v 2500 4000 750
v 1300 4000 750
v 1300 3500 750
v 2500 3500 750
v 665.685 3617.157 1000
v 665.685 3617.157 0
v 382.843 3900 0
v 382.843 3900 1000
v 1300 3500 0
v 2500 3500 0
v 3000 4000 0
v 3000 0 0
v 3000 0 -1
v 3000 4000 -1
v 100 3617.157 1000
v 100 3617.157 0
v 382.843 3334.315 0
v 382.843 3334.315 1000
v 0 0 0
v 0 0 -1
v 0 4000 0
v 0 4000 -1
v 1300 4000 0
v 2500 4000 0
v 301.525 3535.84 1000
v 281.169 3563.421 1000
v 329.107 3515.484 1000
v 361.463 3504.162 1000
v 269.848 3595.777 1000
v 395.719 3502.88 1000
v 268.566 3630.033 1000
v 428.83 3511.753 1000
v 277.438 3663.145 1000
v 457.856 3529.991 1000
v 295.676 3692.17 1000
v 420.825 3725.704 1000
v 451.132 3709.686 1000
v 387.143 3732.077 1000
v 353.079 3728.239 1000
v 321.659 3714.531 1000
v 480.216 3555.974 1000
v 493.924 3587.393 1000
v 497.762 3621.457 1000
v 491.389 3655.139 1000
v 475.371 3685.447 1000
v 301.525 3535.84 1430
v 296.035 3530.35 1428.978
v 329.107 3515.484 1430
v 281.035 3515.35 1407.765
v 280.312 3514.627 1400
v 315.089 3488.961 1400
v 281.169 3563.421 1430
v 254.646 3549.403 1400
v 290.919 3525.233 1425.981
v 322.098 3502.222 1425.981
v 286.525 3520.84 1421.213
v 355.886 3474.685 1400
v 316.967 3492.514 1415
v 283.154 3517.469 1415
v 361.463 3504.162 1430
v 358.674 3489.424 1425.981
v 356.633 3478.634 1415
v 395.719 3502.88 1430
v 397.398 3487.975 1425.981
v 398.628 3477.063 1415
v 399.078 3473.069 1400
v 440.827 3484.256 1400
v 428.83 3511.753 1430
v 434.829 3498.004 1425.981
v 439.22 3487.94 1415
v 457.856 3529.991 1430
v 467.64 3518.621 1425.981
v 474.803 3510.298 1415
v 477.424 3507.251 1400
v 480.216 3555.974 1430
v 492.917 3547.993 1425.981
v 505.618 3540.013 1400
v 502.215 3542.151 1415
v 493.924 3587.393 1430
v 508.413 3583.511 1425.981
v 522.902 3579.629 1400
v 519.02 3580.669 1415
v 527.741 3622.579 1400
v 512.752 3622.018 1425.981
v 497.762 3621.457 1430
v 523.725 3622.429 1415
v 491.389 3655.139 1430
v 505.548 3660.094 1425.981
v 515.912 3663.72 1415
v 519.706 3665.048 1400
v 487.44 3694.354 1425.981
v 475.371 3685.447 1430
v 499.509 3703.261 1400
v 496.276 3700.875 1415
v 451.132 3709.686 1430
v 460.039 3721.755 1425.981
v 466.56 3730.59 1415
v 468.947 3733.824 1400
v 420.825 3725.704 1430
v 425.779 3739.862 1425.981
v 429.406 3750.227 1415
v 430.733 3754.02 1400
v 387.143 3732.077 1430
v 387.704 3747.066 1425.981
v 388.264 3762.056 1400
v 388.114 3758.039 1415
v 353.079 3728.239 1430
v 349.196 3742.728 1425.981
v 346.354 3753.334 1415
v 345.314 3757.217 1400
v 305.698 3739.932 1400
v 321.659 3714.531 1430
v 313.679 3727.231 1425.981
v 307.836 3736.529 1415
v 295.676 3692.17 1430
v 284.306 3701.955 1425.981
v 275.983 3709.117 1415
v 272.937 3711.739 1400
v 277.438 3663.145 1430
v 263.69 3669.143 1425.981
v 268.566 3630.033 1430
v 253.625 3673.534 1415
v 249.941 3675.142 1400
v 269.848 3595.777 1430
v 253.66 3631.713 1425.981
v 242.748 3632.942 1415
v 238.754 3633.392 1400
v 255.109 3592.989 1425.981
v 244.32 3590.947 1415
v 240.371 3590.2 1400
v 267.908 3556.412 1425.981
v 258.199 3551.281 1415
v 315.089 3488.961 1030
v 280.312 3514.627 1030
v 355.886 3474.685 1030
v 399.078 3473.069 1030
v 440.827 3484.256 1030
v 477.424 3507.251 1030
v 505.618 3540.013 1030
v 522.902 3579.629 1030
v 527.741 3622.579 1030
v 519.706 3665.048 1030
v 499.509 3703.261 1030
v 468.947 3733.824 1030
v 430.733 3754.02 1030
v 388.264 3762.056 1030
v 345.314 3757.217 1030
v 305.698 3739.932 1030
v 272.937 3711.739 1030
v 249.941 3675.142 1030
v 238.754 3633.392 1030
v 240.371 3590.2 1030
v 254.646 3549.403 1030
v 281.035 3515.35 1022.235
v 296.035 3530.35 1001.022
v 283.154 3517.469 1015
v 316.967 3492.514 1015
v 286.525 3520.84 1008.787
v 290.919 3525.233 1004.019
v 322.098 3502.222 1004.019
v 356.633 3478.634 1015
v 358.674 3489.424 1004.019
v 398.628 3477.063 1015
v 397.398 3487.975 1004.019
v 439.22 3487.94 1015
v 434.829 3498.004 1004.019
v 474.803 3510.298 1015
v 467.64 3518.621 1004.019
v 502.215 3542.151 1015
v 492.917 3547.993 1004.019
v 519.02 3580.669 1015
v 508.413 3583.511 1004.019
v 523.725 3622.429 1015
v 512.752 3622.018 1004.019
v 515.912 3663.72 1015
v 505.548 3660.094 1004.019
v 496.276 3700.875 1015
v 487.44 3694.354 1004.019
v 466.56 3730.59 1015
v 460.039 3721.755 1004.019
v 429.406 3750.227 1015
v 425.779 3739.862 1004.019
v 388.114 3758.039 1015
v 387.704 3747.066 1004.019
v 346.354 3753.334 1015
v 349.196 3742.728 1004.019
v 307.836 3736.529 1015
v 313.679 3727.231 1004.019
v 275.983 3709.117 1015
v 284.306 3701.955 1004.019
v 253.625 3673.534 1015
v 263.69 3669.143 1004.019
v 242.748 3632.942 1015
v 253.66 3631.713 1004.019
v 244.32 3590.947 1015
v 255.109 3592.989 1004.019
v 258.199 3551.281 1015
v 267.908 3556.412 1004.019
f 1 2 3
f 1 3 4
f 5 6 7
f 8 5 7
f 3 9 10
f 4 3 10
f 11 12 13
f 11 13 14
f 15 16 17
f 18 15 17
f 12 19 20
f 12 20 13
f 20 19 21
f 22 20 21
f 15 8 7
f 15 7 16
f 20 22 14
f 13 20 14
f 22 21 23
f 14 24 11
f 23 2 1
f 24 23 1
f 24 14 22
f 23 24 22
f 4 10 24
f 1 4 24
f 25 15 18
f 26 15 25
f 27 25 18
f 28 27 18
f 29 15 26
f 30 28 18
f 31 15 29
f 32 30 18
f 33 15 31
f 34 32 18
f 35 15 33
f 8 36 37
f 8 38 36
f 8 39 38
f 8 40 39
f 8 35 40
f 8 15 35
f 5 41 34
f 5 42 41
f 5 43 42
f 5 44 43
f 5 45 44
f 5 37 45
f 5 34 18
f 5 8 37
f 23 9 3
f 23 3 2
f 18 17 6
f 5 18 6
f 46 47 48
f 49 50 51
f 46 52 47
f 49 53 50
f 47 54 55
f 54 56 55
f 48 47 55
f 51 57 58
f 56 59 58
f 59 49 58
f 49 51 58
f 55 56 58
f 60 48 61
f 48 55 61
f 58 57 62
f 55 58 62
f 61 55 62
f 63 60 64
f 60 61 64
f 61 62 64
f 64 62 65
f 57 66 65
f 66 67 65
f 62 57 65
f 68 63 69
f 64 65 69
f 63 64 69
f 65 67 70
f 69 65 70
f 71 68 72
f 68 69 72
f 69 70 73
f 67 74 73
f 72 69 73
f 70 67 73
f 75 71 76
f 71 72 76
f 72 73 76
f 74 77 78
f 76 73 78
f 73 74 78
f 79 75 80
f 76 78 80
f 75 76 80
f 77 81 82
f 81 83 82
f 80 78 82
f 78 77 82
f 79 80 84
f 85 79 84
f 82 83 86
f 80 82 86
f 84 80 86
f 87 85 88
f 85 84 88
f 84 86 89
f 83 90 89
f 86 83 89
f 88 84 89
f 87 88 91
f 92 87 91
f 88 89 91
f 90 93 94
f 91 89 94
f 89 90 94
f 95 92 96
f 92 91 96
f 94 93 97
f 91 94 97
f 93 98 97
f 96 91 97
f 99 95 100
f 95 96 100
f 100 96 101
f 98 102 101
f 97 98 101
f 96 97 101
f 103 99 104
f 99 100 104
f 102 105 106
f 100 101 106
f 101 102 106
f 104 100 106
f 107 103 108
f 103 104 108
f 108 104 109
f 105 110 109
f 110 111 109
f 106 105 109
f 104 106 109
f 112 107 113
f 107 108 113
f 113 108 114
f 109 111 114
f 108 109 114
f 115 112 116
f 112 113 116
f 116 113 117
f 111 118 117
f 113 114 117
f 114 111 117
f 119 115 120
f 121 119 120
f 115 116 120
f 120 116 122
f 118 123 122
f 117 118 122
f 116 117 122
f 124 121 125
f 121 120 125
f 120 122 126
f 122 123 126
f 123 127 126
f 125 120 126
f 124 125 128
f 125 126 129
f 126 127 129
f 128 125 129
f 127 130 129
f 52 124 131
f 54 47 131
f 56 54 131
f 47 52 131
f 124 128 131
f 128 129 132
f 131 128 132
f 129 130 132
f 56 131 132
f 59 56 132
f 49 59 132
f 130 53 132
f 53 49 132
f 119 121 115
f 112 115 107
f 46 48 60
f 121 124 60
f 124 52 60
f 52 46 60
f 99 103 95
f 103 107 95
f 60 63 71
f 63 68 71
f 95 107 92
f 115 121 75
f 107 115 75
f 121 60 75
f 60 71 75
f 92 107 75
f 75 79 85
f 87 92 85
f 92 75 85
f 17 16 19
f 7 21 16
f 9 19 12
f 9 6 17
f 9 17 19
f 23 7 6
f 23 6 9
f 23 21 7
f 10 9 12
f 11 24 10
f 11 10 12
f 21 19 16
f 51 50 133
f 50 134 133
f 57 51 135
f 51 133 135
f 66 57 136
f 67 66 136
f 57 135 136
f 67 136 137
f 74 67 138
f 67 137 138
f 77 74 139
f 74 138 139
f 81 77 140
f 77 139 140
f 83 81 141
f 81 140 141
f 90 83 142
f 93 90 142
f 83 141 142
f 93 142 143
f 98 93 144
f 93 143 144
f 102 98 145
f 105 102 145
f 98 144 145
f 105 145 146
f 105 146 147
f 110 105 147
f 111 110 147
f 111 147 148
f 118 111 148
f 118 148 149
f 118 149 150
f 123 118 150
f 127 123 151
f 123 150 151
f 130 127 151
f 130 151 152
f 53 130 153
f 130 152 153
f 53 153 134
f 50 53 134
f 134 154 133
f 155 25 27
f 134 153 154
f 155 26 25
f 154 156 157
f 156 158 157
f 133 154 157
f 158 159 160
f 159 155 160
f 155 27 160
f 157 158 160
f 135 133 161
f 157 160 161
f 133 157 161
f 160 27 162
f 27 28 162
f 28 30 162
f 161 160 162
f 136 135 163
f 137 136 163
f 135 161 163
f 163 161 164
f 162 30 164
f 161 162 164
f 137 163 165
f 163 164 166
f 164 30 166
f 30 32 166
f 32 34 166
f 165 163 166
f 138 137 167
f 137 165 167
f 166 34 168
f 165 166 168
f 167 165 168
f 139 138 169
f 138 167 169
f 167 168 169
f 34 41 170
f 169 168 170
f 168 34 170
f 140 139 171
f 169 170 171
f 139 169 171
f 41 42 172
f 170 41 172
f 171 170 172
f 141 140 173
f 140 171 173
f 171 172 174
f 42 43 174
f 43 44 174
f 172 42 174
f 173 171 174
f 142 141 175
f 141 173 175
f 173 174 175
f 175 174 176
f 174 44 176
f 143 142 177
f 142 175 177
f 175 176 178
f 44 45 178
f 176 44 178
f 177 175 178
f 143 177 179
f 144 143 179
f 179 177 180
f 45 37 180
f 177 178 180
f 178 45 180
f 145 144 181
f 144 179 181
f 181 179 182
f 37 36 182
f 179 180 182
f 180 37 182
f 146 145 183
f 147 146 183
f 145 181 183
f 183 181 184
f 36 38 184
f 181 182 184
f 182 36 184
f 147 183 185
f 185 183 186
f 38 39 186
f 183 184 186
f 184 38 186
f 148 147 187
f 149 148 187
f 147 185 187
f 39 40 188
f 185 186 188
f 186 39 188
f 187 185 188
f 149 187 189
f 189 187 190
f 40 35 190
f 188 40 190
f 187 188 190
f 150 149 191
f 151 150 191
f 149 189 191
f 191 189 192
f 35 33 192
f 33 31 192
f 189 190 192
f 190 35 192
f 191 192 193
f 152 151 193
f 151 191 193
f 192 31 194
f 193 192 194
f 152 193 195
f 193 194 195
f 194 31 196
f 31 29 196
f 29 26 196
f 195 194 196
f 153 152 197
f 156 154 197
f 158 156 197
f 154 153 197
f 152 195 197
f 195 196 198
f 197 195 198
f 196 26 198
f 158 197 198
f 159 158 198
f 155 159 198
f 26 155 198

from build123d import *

# Parameters (mm, degrees)
F0_W     = 3000
F0_H     = 4000
F2_DEPTH = 1
F5_DEPTH = 1000
F3_W     = 1200
F3_H     = 500
F6_DEPTH = 750


# Not quite as in the source:
# - the program builds the solid bodies; features that only make, move or delete a surface that nothing else refers to are left out


with BuildPart() as f2:
    # F0 (on Top) → F2 (new body)
    with BuildSketch(Plane.XY):
        with Locations((1500, 2000)):
            Rectangle(F0_W, F0_H)
    extrude(amount=-F2_DEPTH)

    # F4 (on Top) → F5 (join)
    with BuildSketch(Plane.XY):
        Polygon((665.6854249492, 3617.1572875254), (382.8427124746, 3900), (100, 3617.1572875254), (382.8427124746, 3334.3145750508), align=None)
    extrude(amount=F5_DEPTH)

    # F3 (on face) → F6 (join)
    with BuildSketch(Plane.XY):
        with Locations((1900, 3750)):
            Rectangle(F3_W, F3_H)
    extrude(amount=F6_DEPTH)

    # F8 (on offset) → F9 (revolve)
    with BuildSketch(Plane(origin=(-1617.1572875254, 1617.1572875254, 0), x_dir=(0.7071067812, 0.7071067812, 0), z_dir=(0.7071067812, -0.7071067812, 0))):
        with BuildLine():
            Line((2803.4271247462, 900), (2828.4271247462, 900))
            Line((2828.4271247462, 900), (2828.4271247462, 1430))
            Line((2828.4271247462, 1430), (2713.4271247462, 1430))
            ThreePointArc((2713.4271247462, 1430), (2692.2139213106, 1421.2132034356), (2683.4271247462, 1400))
            Line((2683.4271247462, 1400), (2683.4271247462, 1030))
            ThreePointArc((2683.4271247462, 1030), (2692.2139213106, 1008.7867965644), (2713.4271247462, 1000))
            Line((2713.4271247462, 1000), (2803.4271247462, 1000))
            Line((2803.4271247462, 1000), (2803.4271247462, 900))
        make_face()
    revolve(axis=Axis((382.8427124746, 3617.1572875254, 1165), (0, 0, 1)))


solid = f2.part
